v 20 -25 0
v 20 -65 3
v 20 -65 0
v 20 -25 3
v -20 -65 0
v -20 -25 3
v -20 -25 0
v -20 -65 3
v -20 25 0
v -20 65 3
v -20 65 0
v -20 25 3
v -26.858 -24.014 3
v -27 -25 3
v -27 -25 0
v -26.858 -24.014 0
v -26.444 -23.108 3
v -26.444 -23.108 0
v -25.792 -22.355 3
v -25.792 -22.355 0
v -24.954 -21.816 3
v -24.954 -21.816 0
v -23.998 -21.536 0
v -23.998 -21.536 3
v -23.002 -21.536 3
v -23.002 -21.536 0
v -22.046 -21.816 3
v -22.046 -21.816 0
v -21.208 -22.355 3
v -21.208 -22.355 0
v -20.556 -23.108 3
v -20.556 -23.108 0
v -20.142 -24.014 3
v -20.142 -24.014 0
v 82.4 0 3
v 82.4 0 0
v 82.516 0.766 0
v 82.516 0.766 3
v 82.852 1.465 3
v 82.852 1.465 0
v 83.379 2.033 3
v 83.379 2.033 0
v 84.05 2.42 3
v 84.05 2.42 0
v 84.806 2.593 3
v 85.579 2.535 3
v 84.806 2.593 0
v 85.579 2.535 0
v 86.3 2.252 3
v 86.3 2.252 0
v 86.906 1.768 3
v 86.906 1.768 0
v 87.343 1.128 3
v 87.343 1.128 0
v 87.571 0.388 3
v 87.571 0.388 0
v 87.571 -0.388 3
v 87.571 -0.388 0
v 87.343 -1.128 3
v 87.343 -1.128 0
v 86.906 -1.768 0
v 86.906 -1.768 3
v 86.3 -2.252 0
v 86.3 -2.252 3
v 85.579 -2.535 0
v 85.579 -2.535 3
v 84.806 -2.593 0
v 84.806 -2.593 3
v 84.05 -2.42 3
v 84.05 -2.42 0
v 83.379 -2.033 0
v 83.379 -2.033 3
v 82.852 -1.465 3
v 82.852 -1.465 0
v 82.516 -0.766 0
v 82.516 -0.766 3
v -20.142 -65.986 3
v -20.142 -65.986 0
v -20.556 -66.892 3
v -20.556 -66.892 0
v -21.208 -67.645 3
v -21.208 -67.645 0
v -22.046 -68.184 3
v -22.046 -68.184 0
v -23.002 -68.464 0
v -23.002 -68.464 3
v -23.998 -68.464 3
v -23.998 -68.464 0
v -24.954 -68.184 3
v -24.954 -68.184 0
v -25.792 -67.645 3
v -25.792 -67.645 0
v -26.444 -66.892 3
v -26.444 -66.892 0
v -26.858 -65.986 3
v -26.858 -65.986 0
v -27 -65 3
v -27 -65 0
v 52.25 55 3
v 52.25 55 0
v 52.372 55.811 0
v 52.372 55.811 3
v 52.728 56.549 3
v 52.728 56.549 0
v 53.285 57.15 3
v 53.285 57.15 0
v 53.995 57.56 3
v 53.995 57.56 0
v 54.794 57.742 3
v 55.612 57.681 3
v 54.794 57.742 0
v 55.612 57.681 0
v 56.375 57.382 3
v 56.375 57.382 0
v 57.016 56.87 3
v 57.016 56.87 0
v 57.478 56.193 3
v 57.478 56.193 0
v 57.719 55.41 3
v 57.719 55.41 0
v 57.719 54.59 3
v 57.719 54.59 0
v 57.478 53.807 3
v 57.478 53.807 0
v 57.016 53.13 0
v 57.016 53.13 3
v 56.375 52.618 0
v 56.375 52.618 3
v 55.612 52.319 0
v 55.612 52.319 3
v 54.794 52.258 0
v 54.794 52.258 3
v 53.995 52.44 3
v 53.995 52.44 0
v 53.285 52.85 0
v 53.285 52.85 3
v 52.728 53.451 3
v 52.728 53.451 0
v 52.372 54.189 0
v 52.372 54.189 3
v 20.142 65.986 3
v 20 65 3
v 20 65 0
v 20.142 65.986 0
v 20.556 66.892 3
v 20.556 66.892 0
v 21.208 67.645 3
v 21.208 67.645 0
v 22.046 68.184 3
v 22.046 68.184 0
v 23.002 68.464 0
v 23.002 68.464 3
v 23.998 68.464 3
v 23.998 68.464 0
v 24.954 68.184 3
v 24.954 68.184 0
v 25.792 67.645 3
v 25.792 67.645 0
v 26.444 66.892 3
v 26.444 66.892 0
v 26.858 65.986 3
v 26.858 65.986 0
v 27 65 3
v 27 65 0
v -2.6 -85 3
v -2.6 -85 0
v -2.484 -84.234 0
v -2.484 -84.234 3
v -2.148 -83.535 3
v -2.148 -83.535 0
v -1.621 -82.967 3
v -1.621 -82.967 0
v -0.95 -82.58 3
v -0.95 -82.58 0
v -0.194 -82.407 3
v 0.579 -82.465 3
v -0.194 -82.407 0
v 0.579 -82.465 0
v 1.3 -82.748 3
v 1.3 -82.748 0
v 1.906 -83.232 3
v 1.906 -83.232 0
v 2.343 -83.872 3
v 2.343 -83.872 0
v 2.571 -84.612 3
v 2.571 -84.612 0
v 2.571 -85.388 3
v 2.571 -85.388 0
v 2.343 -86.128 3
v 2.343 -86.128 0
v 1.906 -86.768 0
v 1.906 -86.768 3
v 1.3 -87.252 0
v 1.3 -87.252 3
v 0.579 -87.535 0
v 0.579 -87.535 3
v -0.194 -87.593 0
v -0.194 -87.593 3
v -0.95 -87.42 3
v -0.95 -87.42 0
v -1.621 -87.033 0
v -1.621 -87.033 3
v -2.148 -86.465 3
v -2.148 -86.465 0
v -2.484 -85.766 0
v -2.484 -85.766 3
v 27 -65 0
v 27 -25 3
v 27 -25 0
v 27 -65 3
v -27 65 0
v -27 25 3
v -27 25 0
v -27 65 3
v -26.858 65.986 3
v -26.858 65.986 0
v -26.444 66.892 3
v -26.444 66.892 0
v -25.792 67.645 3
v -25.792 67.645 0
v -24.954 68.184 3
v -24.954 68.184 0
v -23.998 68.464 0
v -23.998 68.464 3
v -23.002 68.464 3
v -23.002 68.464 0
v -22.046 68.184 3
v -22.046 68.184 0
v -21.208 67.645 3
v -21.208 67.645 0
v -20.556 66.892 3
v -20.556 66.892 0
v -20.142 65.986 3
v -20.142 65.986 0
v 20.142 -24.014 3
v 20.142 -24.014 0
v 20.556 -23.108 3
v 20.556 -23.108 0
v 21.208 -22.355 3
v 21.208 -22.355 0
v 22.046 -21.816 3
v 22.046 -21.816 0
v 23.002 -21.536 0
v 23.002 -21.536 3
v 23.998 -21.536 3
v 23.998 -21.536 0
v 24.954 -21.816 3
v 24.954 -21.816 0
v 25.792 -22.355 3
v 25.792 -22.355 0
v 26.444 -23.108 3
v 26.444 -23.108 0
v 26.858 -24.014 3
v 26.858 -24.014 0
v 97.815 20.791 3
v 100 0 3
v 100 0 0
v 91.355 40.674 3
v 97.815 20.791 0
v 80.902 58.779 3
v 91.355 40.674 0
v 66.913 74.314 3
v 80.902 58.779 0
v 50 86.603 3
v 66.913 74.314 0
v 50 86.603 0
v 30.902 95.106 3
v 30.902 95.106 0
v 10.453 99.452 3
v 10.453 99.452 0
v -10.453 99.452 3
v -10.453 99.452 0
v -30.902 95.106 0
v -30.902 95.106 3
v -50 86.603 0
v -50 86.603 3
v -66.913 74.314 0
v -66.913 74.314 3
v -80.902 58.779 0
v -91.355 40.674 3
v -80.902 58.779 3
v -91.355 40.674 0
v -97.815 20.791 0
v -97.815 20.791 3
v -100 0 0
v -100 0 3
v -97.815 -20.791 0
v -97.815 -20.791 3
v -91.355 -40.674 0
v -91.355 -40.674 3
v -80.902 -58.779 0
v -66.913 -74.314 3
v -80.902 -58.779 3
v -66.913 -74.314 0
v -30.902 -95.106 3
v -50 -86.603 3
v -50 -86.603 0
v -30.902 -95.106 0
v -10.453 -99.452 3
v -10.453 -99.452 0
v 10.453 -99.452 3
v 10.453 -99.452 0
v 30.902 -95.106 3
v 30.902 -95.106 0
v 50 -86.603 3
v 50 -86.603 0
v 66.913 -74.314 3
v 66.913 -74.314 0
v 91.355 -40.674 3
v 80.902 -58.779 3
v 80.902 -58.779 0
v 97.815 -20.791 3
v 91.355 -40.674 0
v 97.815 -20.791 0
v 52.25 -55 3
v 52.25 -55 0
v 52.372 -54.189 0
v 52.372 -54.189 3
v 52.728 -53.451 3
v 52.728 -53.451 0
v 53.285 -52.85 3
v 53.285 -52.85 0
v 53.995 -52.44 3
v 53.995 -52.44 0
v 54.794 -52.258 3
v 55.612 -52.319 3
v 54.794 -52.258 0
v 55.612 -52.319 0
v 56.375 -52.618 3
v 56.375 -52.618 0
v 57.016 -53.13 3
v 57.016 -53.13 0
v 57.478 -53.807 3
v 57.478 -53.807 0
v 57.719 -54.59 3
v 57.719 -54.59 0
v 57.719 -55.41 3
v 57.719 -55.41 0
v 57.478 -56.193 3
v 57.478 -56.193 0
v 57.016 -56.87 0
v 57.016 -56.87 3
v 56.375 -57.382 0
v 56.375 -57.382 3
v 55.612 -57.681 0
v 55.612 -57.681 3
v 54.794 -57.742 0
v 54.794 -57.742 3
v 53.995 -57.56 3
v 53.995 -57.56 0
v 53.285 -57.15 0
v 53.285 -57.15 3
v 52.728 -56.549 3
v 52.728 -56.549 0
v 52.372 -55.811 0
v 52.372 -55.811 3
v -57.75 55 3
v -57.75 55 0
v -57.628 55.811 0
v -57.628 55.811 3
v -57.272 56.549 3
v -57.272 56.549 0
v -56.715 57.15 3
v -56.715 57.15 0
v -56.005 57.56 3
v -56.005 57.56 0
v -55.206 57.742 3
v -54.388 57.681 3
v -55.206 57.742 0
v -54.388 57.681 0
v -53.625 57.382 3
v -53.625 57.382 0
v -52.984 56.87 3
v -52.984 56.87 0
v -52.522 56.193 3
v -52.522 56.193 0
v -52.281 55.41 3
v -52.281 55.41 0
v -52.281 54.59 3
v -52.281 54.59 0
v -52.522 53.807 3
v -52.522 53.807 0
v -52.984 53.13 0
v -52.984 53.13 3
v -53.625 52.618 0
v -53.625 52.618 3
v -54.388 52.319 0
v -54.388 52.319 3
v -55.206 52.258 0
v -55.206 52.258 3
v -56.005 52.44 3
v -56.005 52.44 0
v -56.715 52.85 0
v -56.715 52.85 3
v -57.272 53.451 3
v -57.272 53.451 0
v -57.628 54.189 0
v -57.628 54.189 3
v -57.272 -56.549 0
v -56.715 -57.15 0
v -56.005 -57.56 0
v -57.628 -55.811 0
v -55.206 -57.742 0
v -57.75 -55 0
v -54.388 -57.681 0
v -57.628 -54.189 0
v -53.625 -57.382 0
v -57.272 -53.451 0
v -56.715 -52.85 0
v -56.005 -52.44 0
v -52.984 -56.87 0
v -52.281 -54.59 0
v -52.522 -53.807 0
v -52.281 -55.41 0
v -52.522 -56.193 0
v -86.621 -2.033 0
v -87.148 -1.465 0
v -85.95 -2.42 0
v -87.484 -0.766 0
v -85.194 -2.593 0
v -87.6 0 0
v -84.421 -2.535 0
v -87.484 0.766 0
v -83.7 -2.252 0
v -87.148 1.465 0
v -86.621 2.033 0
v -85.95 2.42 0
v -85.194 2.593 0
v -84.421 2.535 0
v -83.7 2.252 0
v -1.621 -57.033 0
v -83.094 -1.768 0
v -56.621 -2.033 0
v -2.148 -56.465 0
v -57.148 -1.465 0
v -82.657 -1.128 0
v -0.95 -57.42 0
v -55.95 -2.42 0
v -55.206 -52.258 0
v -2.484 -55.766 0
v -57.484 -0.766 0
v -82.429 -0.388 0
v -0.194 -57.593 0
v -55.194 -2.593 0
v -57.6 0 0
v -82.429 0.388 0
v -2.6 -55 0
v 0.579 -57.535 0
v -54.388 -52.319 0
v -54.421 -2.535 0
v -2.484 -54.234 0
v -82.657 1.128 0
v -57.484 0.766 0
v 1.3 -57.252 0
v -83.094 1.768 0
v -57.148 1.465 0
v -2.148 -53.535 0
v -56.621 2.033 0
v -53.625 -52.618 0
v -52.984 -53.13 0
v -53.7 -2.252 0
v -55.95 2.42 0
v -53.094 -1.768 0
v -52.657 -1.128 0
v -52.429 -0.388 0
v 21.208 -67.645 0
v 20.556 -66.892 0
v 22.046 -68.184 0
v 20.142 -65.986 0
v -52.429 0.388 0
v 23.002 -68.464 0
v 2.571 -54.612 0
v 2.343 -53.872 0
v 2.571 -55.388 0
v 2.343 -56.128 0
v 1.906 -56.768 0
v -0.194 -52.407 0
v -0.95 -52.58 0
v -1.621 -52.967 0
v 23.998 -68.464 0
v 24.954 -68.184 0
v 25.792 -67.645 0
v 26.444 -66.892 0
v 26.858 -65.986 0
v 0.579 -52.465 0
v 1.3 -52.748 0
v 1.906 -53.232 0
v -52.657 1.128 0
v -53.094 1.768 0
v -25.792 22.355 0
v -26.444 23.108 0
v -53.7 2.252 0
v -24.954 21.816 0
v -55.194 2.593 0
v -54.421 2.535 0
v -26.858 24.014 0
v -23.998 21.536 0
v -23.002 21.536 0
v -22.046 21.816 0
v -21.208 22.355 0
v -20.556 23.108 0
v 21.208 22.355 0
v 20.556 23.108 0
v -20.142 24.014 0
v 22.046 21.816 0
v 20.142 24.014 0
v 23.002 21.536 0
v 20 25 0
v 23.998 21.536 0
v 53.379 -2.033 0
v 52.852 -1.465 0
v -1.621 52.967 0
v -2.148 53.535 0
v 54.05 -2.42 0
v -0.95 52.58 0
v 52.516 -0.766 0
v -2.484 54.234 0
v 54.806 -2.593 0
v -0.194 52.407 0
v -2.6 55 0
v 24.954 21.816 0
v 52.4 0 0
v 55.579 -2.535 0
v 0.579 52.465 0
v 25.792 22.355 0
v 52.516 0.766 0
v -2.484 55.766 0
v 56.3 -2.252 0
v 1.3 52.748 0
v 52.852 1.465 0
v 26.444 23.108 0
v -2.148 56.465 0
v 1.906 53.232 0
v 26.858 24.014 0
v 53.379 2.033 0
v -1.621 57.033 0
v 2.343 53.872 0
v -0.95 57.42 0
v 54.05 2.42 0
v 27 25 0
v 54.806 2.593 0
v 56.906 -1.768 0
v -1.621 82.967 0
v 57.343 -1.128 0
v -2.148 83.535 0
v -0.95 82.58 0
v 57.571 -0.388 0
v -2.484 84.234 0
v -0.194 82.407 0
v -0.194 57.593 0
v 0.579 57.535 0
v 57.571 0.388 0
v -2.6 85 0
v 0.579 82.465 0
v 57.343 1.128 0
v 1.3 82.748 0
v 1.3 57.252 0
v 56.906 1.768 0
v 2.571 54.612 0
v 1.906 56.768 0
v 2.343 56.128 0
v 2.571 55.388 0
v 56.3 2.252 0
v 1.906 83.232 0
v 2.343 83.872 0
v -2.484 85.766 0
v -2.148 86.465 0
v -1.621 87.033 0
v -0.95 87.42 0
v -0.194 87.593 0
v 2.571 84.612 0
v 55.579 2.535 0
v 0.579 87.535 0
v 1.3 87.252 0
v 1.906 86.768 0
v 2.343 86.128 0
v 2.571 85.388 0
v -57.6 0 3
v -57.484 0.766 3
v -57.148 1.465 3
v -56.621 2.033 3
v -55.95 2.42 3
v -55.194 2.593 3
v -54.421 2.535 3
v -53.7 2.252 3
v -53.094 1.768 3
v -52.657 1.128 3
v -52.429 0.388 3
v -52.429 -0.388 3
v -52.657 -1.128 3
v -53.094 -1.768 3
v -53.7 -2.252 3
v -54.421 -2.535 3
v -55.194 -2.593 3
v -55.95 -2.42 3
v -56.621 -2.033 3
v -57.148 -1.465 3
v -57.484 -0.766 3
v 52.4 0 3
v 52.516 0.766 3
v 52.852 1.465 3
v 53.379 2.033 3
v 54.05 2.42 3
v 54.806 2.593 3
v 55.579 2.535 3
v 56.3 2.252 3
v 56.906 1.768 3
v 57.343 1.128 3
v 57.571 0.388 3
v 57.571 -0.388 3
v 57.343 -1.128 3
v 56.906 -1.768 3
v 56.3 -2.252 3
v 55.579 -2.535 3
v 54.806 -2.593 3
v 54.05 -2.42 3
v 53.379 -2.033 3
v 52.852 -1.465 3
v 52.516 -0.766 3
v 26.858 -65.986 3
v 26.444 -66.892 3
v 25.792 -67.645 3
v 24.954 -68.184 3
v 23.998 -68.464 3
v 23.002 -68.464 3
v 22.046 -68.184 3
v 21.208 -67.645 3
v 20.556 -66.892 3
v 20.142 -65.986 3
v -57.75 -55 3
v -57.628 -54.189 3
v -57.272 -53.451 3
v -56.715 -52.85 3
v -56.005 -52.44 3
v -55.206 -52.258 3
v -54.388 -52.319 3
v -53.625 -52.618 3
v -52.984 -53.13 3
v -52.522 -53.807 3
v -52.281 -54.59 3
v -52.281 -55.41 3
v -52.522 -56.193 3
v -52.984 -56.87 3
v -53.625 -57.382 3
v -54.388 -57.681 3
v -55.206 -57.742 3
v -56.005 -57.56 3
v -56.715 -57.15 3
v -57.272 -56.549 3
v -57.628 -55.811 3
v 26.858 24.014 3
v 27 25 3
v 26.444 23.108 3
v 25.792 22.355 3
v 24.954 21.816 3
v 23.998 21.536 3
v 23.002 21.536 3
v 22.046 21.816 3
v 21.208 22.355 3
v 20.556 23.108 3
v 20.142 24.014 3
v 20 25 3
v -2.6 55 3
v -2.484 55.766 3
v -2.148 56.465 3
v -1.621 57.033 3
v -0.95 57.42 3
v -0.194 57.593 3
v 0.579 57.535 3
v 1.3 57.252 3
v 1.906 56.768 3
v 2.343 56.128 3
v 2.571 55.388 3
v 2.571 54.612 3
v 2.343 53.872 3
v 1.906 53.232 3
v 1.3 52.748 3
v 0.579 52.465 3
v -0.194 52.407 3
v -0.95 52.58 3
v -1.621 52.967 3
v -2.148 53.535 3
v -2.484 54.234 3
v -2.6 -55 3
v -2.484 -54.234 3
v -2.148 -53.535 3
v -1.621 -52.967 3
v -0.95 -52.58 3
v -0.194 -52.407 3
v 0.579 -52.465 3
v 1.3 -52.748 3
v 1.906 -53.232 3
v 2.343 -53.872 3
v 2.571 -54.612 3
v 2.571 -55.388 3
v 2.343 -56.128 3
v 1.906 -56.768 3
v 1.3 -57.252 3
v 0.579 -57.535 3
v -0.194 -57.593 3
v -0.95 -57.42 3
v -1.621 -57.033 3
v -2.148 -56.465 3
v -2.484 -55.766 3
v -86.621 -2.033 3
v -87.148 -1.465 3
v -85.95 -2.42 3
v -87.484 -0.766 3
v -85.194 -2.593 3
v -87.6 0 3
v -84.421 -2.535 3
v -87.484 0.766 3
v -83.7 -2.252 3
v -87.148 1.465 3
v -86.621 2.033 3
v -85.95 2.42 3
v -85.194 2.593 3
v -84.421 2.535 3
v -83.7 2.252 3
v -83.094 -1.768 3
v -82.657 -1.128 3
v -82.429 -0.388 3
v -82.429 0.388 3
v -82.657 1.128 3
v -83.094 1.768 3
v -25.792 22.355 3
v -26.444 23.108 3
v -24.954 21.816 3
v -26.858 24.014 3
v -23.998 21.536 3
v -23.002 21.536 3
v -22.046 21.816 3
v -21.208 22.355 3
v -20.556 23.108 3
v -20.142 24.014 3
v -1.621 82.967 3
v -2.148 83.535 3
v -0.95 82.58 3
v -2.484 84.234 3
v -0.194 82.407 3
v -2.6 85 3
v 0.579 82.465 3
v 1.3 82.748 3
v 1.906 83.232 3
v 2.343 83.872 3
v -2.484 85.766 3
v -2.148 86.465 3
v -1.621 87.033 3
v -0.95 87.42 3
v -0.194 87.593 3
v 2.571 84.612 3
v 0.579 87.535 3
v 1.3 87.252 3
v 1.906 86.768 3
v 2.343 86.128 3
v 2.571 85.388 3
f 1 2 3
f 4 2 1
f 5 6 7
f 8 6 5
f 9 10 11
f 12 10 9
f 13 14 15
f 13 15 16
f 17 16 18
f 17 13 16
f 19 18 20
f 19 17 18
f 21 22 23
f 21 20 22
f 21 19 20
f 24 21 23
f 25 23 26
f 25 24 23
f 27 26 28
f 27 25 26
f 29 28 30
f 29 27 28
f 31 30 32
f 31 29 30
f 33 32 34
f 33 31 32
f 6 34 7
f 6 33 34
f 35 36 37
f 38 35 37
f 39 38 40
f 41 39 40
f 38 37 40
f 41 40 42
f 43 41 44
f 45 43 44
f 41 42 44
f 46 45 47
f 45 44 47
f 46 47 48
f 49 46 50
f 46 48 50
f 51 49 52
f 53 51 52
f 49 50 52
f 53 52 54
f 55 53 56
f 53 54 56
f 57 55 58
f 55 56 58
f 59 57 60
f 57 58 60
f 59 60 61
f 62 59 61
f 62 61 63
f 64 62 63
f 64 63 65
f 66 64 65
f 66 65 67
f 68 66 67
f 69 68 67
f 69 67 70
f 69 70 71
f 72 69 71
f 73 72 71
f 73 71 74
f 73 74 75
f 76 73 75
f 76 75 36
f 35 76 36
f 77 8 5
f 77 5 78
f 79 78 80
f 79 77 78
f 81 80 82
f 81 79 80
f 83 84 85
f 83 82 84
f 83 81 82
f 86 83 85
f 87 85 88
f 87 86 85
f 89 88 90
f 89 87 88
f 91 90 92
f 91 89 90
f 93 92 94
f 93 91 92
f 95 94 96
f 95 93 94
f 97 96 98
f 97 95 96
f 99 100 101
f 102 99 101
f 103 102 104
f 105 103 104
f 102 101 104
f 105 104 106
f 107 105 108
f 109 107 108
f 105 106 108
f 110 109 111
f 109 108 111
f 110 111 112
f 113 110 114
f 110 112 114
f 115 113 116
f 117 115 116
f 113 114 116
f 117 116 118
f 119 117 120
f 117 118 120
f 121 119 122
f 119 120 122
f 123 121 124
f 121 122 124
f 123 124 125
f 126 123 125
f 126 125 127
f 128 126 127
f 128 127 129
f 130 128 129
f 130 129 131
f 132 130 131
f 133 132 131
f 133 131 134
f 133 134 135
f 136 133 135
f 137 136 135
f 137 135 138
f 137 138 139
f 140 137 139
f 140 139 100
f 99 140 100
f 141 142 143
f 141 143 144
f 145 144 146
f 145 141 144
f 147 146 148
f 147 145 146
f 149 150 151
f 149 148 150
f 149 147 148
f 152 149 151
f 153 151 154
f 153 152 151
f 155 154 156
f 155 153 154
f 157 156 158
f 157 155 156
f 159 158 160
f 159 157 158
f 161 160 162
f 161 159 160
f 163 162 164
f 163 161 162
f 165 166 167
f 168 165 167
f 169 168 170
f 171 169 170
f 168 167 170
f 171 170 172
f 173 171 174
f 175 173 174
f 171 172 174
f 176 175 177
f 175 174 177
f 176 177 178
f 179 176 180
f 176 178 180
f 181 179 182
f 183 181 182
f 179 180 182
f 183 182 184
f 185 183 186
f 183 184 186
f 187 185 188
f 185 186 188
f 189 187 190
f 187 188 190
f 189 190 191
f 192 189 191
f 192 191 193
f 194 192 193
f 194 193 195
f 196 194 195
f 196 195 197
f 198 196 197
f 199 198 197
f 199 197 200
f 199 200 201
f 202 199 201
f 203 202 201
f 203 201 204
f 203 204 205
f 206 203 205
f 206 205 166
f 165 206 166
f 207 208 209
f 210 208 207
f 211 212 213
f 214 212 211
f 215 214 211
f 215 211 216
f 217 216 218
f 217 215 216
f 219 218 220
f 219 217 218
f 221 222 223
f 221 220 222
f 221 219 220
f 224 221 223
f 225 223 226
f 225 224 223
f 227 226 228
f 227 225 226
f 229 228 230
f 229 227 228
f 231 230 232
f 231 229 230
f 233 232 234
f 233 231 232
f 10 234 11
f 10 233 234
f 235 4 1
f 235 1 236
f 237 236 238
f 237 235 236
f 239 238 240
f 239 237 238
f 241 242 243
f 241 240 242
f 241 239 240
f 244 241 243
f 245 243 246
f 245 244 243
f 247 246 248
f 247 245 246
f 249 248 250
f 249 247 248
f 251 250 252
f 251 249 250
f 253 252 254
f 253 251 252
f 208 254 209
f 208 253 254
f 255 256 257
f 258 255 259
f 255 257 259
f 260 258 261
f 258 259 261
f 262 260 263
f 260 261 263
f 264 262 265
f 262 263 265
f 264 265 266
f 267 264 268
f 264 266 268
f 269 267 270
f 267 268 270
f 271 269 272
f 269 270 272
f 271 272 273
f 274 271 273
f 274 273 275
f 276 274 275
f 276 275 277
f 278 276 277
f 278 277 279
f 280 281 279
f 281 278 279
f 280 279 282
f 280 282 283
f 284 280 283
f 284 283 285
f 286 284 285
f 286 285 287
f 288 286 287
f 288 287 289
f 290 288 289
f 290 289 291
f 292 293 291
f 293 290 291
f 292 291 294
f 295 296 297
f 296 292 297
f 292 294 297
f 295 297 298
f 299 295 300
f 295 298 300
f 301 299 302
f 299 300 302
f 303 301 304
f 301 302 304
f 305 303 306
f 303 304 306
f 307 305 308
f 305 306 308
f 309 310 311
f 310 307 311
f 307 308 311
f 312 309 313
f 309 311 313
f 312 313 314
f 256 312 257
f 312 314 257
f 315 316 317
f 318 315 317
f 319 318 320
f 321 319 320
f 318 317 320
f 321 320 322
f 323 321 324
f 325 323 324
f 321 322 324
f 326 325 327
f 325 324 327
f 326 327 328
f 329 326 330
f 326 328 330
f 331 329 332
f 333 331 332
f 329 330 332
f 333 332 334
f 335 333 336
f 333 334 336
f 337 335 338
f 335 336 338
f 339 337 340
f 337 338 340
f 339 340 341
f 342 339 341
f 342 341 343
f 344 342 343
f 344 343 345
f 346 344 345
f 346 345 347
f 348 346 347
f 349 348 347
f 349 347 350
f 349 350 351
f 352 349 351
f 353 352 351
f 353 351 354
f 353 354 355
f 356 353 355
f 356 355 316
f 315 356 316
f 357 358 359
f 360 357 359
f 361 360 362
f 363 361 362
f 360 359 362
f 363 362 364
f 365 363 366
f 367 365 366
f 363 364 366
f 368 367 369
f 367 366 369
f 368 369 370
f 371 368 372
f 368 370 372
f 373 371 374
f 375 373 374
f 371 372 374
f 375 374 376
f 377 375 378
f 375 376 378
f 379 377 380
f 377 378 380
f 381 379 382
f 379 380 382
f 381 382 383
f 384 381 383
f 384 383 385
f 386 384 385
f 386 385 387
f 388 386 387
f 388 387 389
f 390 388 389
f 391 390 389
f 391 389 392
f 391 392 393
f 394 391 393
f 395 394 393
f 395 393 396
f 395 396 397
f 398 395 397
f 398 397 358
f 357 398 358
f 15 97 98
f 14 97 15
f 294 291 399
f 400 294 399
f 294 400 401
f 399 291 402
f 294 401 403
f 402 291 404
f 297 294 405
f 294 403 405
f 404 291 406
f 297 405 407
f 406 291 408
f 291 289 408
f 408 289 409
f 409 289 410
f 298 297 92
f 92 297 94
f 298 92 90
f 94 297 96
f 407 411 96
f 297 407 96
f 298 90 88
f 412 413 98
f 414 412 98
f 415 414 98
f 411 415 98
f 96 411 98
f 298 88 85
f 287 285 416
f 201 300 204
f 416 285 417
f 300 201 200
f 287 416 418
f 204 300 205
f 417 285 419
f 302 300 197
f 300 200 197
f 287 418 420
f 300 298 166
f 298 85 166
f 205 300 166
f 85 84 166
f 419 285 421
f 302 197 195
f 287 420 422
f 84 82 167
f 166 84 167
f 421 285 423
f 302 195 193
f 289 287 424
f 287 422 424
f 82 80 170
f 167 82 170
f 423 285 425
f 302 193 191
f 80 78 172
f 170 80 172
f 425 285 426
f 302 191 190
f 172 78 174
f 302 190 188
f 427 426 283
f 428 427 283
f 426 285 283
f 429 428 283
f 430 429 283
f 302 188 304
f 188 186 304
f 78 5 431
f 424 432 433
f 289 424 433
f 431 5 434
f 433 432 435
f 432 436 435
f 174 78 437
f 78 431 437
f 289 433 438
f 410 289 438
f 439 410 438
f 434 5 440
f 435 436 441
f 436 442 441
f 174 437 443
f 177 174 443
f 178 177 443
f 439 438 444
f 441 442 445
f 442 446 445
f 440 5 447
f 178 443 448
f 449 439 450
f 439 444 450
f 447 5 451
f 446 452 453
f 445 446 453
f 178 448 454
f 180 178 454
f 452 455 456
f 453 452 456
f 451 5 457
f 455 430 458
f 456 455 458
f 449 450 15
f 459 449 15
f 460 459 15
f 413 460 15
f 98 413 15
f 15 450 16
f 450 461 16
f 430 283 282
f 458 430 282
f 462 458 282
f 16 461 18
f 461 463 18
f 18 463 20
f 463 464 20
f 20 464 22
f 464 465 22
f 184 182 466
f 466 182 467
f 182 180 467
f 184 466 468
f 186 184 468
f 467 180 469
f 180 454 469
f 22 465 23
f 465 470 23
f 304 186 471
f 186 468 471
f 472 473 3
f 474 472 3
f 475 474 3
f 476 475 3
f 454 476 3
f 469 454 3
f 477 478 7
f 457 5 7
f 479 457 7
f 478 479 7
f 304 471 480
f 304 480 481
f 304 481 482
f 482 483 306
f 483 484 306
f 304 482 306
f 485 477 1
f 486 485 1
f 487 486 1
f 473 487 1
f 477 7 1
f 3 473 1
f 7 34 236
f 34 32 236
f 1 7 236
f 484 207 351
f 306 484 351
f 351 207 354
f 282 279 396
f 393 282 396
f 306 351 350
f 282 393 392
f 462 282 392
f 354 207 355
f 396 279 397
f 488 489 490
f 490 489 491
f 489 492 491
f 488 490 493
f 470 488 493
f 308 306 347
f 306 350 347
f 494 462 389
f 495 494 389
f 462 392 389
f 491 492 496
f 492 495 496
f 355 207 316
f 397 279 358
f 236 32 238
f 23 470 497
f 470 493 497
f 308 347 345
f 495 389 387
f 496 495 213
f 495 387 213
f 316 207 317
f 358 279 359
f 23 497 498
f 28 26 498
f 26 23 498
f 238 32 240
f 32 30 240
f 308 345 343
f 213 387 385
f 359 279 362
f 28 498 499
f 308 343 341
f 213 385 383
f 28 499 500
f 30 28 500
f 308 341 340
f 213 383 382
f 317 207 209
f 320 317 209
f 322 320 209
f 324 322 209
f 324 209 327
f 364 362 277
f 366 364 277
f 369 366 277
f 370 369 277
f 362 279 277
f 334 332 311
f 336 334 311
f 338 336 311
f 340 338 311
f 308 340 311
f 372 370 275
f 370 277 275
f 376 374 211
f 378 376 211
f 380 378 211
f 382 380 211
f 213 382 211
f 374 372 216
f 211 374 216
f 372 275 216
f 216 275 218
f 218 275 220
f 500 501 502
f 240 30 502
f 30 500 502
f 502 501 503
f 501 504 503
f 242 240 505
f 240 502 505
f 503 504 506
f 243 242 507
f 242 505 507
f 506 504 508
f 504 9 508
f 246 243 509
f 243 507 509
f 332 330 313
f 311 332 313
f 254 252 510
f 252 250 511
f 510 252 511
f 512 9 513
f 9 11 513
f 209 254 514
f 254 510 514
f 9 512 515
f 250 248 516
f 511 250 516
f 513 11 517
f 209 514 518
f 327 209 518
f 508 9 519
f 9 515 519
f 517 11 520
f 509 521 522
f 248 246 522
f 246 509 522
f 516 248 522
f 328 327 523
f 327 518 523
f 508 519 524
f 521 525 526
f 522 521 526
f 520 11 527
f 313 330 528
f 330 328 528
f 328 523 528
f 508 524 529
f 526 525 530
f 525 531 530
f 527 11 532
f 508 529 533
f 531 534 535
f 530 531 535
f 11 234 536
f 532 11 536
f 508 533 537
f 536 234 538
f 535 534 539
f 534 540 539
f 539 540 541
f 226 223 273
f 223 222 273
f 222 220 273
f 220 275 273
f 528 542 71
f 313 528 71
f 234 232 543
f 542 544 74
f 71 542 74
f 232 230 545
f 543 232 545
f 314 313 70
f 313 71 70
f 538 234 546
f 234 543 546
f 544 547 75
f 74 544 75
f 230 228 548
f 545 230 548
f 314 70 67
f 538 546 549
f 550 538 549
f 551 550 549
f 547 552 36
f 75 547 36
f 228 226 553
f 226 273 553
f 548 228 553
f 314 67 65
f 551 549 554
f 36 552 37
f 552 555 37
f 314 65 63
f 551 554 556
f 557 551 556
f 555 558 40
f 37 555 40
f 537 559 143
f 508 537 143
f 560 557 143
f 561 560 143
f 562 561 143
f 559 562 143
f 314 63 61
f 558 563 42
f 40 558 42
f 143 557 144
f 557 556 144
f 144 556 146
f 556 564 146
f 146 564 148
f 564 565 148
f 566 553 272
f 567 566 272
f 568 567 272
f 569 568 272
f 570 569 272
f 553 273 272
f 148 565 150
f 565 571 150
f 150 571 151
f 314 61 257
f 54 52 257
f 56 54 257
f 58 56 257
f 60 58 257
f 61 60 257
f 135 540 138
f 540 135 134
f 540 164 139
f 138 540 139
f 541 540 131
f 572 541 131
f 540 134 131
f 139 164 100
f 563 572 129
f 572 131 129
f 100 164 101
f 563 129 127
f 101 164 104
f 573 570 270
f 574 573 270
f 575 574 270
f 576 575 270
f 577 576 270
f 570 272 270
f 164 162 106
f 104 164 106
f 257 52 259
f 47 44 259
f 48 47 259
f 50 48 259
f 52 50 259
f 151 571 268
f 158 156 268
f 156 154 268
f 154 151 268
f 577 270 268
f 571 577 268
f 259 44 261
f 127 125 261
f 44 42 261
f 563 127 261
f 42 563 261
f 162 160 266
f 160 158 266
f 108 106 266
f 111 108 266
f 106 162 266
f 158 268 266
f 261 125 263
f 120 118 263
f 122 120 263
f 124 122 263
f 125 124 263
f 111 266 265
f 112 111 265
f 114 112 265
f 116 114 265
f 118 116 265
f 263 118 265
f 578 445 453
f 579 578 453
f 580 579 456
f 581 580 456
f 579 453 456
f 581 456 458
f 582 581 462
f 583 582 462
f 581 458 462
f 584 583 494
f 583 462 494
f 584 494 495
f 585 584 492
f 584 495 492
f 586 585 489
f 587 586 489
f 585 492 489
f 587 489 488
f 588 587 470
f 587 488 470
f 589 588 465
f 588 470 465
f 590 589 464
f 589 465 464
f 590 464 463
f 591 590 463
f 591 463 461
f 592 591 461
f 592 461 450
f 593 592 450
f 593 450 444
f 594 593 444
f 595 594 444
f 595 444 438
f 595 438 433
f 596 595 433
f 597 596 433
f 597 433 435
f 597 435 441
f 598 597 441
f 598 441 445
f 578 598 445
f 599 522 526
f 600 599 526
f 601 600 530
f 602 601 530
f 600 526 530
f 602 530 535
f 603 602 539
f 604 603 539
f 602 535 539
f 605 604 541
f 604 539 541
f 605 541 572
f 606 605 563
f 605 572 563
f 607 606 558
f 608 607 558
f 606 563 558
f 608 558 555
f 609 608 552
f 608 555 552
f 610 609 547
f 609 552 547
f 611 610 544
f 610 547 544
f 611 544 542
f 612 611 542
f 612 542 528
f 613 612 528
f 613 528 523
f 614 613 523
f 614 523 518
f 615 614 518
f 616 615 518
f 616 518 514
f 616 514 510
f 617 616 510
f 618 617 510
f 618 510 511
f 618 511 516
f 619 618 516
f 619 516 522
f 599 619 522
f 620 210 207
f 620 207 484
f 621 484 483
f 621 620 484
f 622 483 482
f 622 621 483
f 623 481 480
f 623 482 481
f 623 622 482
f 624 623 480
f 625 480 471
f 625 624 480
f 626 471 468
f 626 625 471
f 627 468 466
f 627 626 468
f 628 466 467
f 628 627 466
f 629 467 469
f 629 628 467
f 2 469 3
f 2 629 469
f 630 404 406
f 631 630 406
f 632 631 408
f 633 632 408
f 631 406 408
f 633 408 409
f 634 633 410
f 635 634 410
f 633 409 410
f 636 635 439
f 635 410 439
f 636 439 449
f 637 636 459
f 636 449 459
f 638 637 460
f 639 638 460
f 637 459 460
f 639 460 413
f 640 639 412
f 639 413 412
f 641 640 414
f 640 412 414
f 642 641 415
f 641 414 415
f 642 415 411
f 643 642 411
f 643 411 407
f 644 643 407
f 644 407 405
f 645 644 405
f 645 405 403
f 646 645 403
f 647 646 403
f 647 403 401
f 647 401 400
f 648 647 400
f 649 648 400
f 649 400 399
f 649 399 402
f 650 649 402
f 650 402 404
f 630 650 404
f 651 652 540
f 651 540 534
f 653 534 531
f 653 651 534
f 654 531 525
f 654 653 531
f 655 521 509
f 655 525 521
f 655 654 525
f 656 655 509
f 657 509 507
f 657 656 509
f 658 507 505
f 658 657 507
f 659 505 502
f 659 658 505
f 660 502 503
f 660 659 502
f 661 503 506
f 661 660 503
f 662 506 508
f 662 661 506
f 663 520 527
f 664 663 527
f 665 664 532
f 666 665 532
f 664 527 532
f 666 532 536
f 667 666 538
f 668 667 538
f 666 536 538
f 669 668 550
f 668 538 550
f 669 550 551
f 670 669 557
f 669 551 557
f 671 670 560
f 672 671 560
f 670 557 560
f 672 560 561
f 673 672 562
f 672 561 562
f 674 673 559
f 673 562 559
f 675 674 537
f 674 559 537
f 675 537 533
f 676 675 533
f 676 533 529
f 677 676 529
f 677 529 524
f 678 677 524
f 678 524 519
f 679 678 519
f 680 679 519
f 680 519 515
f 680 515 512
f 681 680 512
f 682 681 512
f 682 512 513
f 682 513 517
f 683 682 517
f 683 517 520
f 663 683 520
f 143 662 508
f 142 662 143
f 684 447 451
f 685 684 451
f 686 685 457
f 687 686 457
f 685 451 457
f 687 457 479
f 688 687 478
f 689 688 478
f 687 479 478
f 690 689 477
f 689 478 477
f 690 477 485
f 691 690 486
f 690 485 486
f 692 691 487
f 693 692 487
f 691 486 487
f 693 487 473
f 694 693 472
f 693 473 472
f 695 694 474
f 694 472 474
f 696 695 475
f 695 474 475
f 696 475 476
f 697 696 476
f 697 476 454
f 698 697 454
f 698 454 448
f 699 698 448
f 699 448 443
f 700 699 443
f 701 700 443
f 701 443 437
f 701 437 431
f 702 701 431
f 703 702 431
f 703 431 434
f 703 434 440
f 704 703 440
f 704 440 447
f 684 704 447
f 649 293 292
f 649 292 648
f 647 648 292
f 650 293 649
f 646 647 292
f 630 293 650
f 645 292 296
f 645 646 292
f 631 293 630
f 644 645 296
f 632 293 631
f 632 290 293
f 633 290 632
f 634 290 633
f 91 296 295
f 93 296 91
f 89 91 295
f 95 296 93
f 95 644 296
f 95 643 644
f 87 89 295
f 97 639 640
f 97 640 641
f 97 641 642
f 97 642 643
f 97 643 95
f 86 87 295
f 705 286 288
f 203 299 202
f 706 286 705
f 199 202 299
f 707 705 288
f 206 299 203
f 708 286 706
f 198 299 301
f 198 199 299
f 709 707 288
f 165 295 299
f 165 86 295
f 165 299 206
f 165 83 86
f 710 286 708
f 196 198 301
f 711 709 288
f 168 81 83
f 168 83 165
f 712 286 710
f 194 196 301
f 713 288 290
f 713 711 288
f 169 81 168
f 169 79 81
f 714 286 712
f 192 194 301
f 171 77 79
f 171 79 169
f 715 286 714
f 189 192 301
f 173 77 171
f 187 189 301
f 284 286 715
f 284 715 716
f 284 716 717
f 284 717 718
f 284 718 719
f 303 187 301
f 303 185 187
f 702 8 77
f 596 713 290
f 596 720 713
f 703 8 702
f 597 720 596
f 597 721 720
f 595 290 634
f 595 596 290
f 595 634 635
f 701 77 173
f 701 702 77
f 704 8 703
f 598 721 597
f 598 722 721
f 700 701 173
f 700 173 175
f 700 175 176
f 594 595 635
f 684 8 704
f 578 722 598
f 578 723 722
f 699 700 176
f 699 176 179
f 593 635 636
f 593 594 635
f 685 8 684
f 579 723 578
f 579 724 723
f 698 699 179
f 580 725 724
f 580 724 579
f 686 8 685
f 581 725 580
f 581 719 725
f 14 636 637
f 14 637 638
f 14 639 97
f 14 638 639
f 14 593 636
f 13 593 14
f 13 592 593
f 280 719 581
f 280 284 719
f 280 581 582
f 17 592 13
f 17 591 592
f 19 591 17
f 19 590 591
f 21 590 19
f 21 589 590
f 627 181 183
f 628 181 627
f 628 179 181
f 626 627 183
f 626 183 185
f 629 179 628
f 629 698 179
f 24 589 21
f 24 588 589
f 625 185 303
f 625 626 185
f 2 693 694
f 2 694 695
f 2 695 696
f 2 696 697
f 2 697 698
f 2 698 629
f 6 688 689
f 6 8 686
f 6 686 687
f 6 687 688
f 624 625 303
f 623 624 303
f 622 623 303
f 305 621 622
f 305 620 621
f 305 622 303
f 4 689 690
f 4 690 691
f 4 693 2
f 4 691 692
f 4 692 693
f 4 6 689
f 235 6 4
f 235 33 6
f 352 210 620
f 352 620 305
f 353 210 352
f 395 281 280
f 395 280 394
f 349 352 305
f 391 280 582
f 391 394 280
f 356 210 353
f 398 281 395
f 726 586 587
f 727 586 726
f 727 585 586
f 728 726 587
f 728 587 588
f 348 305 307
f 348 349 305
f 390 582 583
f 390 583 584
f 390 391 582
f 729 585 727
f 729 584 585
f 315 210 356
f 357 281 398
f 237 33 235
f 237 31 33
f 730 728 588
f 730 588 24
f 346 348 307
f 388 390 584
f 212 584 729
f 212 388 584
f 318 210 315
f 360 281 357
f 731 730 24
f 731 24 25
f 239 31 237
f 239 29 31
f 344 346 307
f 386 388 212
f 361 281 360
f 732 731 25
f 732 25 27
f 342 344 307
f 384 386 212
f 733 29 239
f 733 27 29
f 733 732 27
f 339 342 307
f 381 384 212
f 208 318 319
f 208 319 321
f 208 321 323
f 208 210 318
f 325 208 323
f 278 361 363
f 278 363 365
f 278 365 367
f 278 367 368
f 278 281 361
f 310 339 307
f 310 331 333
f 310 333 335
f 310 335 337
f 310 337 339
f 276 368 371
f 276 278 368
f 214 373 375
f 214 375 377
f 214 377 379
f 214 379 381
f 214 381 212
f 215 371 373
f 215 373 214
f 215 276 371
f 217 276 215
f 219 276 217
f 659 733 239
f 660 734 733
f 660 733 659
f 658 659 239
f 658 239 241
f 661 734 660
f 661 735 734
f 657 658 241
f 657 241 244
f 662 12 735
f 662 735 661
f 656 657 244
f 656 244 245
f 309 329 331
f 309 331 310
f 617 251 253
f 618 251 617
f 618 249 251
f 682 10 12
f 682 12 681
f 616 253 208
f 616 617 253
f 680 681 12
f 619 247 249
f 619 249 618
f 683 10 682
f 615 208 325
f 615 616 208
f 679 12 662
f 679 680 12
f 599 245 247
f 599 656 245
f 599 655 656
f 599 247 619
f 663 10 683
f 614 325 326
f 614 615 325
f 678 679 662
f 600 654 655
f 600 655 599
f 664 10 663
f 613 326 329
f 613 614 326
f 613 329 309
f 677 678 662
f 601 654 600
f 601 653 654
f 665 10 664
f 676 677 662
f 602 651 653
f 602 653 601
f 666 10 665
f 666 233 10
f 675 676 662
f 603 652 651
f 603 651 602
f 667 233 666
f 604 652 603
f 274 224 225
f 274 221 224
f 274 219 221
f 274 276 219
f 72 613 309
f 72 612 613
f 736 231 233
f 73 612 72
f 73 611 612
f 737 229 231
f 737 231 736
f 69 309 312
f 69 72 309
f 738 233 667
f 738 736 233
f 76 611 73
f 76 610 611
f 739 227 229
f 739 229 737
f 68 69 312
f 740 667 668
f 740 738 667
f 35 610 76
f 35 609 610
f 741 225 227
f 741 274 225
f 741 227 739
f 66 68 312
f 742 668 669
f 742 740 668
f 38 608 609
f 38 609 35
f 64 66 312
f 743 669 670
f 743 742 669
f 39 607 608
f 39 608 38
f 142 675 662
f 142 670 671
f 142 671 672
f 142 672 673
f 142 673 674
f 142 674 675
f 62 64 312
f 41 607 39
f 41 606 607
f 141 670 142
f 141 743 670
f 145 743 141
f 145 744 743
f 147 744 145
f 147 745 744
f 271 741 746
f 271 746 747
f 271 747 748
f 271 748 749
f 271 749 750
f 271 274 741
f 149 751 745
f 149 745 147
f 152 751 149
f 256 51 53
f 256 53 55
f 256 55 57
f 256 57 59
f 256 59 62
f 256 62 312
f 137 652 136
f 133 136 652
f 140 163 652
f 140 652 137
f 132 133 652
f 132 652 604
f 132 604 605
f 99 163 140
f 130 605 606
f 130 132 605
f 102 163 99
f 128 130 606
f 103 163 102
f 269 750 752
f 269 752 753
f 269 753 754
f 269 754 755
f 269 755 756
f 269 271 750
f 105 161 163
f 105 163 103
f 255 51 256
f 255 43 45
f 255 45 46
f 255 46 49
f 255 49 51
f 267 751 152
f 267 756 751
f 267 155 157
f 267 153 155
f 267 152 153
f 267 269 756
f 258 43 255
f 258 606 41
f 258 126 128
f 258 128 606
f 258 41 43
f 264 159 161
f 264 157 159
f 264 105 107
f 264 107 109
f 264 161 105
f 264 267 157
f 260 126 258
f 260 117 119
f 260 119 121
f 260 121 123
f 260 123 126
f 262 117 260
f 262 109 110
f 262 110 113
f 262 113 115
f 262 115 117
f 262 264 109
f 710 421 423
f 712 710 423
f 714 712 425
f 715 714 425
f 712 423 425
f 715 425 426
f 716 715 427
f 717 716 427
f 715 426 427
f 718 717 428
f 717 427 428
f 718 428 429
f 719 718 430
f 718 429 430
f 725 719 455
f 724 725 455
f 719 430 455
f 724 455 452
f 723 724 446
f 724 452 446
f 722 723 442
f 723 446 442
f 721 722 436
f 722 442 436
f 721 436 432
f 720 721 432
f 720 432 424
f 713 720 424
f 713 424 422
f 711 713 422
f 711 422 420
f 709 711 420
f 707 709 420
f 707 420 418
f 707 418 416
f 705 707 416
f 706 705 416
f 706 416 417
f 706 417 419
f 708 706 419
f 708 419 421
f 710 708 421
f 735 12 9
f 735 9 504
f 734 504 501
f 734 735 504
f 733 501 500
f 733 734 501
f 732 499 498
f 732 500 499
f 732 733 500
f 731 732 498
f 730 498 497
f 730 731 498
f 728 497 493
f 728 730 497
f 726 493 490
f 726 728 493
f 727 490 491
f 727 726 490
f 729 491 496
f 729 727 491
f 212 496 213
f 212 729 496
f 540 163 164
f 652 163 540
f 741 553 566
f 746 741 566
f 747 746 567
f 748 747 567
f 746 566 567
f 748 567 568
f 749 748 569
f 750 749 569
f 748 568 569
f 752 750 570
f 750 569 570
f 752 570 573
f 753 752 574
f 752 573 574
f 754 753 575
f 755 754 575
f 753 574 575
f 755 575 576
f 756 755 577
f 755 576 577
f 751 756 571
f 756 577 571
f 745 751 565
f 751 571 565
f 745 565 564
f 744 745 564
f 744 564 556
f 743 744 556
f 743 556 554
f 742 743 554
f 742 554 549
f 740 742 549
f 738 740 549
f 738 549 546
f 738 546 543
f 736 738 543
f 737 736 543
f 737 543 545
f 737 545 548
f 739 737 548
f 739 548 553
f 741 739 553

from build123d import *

# Parameters (mm, degrees)
IZIM1_R                              = 100
Y_KSEKLIK_EKSTR_ZYON1_DEPTH          = 30
M5_HELISARMAL_I_IN_Z_VANA_MATKAB_1_D = 5.2
KES_EKSTR_ZYON1_DEPTH                = 145.568322948
M5_BO_LUKLU_DELIK2_D                 = 5.5
IZIM20_R                             = 183.537558205
KES_EKSTR_ZYON2_DEPTH                = 27


with BuildPart() as part:
    # Çizim1 → Yükseklik-Ekstrüzyon1 (new body)
    with BuildSketch(Plane.XY):
        Circle(IZIM1_R)
    extrude(amount=Y_KSEKLIK_EKSTR_ZYON1_DEPTH)

    # M5 Helisarmal için Zıvana matkabı1 (through all)
    with Locations(Plane.XY.offset(30)):
        with Locations((-85, 0), (-55, 0), (0, 55), (0, 85), (55, 0), (85, 0), (0, -55), (0, -85)):
            Hole(M5_HELISARMAL_I_IN_Z_VANA_MATKAB_1_D / 2)

    # Çizim9 → Kes-Ekstrüzyon1 (cut, through all)
    with BuildSketch(Plane.XY.offset(30)):
        with BuildLine():
            Line((27, 65), (27, 25))
            ThreePointArc((27, 25), (23.5, 21.5), (20, 25))
            Line((20, 25), (20, 65))
            ThreePointArc((20, 65), (23.5, 68.5), (27, 65))
        make_face()
        with BuildLine():
            Line((-20, 65), (-20, 25))
            ThreePointArc((-20, 25), (-23.5, 21.5), (-27, 25))
            Line((-27, 25), (-27, 65))
            ThreePointArc((-27, 65), (-23.5, 68.5), (-20, 65))
        make_face()
        with BuildLine():
            Line((-20, -25), (-20, -65))
            ThreePointArc((-20, -65), (-23.5, -68.5), (-27, -65))
            Line((-27, -65), (-27, -25))
            ThreePointArc((-27, -25), (-23.5, -21.5), (-20, -25))
        make_face()
        with BuildLine():
            Line((20, -65), (20, -25))
            ThreePointArc((20, -25), (23.5, -21.5), (27, -25))
            Line((27, -25), (27, -65))
            ThreePointArc((27, -65), (23.5, -68.5), (20, -65))
        make_face()
    extrude(amount=-KES_EKSTR_ZYON1_DEPTH, mode=Mode.SUBTRACT)

    # M5 Boşluklu Delik2 (through all)
    with Locations(Plane.XY.offset(30)):
        with Locations((-55, 55), (55, 55), (55, -55), (-55, -55)):
            Hole(M5_BO_LUKLU_DELIK2_D / 2)

    # Çizim20 → Kes-Ekstrüzyon2 (cut)
    with BuildSketch(Plane.XY.offset(30)):
        with Locations((0, 8.479468632)):
            Circle(IZIM20_R)
    extrude(amount=-KES_EKSTR_ZYON2_DEPTH, mode=Mode.SUBTRACT)


solid = part.part
